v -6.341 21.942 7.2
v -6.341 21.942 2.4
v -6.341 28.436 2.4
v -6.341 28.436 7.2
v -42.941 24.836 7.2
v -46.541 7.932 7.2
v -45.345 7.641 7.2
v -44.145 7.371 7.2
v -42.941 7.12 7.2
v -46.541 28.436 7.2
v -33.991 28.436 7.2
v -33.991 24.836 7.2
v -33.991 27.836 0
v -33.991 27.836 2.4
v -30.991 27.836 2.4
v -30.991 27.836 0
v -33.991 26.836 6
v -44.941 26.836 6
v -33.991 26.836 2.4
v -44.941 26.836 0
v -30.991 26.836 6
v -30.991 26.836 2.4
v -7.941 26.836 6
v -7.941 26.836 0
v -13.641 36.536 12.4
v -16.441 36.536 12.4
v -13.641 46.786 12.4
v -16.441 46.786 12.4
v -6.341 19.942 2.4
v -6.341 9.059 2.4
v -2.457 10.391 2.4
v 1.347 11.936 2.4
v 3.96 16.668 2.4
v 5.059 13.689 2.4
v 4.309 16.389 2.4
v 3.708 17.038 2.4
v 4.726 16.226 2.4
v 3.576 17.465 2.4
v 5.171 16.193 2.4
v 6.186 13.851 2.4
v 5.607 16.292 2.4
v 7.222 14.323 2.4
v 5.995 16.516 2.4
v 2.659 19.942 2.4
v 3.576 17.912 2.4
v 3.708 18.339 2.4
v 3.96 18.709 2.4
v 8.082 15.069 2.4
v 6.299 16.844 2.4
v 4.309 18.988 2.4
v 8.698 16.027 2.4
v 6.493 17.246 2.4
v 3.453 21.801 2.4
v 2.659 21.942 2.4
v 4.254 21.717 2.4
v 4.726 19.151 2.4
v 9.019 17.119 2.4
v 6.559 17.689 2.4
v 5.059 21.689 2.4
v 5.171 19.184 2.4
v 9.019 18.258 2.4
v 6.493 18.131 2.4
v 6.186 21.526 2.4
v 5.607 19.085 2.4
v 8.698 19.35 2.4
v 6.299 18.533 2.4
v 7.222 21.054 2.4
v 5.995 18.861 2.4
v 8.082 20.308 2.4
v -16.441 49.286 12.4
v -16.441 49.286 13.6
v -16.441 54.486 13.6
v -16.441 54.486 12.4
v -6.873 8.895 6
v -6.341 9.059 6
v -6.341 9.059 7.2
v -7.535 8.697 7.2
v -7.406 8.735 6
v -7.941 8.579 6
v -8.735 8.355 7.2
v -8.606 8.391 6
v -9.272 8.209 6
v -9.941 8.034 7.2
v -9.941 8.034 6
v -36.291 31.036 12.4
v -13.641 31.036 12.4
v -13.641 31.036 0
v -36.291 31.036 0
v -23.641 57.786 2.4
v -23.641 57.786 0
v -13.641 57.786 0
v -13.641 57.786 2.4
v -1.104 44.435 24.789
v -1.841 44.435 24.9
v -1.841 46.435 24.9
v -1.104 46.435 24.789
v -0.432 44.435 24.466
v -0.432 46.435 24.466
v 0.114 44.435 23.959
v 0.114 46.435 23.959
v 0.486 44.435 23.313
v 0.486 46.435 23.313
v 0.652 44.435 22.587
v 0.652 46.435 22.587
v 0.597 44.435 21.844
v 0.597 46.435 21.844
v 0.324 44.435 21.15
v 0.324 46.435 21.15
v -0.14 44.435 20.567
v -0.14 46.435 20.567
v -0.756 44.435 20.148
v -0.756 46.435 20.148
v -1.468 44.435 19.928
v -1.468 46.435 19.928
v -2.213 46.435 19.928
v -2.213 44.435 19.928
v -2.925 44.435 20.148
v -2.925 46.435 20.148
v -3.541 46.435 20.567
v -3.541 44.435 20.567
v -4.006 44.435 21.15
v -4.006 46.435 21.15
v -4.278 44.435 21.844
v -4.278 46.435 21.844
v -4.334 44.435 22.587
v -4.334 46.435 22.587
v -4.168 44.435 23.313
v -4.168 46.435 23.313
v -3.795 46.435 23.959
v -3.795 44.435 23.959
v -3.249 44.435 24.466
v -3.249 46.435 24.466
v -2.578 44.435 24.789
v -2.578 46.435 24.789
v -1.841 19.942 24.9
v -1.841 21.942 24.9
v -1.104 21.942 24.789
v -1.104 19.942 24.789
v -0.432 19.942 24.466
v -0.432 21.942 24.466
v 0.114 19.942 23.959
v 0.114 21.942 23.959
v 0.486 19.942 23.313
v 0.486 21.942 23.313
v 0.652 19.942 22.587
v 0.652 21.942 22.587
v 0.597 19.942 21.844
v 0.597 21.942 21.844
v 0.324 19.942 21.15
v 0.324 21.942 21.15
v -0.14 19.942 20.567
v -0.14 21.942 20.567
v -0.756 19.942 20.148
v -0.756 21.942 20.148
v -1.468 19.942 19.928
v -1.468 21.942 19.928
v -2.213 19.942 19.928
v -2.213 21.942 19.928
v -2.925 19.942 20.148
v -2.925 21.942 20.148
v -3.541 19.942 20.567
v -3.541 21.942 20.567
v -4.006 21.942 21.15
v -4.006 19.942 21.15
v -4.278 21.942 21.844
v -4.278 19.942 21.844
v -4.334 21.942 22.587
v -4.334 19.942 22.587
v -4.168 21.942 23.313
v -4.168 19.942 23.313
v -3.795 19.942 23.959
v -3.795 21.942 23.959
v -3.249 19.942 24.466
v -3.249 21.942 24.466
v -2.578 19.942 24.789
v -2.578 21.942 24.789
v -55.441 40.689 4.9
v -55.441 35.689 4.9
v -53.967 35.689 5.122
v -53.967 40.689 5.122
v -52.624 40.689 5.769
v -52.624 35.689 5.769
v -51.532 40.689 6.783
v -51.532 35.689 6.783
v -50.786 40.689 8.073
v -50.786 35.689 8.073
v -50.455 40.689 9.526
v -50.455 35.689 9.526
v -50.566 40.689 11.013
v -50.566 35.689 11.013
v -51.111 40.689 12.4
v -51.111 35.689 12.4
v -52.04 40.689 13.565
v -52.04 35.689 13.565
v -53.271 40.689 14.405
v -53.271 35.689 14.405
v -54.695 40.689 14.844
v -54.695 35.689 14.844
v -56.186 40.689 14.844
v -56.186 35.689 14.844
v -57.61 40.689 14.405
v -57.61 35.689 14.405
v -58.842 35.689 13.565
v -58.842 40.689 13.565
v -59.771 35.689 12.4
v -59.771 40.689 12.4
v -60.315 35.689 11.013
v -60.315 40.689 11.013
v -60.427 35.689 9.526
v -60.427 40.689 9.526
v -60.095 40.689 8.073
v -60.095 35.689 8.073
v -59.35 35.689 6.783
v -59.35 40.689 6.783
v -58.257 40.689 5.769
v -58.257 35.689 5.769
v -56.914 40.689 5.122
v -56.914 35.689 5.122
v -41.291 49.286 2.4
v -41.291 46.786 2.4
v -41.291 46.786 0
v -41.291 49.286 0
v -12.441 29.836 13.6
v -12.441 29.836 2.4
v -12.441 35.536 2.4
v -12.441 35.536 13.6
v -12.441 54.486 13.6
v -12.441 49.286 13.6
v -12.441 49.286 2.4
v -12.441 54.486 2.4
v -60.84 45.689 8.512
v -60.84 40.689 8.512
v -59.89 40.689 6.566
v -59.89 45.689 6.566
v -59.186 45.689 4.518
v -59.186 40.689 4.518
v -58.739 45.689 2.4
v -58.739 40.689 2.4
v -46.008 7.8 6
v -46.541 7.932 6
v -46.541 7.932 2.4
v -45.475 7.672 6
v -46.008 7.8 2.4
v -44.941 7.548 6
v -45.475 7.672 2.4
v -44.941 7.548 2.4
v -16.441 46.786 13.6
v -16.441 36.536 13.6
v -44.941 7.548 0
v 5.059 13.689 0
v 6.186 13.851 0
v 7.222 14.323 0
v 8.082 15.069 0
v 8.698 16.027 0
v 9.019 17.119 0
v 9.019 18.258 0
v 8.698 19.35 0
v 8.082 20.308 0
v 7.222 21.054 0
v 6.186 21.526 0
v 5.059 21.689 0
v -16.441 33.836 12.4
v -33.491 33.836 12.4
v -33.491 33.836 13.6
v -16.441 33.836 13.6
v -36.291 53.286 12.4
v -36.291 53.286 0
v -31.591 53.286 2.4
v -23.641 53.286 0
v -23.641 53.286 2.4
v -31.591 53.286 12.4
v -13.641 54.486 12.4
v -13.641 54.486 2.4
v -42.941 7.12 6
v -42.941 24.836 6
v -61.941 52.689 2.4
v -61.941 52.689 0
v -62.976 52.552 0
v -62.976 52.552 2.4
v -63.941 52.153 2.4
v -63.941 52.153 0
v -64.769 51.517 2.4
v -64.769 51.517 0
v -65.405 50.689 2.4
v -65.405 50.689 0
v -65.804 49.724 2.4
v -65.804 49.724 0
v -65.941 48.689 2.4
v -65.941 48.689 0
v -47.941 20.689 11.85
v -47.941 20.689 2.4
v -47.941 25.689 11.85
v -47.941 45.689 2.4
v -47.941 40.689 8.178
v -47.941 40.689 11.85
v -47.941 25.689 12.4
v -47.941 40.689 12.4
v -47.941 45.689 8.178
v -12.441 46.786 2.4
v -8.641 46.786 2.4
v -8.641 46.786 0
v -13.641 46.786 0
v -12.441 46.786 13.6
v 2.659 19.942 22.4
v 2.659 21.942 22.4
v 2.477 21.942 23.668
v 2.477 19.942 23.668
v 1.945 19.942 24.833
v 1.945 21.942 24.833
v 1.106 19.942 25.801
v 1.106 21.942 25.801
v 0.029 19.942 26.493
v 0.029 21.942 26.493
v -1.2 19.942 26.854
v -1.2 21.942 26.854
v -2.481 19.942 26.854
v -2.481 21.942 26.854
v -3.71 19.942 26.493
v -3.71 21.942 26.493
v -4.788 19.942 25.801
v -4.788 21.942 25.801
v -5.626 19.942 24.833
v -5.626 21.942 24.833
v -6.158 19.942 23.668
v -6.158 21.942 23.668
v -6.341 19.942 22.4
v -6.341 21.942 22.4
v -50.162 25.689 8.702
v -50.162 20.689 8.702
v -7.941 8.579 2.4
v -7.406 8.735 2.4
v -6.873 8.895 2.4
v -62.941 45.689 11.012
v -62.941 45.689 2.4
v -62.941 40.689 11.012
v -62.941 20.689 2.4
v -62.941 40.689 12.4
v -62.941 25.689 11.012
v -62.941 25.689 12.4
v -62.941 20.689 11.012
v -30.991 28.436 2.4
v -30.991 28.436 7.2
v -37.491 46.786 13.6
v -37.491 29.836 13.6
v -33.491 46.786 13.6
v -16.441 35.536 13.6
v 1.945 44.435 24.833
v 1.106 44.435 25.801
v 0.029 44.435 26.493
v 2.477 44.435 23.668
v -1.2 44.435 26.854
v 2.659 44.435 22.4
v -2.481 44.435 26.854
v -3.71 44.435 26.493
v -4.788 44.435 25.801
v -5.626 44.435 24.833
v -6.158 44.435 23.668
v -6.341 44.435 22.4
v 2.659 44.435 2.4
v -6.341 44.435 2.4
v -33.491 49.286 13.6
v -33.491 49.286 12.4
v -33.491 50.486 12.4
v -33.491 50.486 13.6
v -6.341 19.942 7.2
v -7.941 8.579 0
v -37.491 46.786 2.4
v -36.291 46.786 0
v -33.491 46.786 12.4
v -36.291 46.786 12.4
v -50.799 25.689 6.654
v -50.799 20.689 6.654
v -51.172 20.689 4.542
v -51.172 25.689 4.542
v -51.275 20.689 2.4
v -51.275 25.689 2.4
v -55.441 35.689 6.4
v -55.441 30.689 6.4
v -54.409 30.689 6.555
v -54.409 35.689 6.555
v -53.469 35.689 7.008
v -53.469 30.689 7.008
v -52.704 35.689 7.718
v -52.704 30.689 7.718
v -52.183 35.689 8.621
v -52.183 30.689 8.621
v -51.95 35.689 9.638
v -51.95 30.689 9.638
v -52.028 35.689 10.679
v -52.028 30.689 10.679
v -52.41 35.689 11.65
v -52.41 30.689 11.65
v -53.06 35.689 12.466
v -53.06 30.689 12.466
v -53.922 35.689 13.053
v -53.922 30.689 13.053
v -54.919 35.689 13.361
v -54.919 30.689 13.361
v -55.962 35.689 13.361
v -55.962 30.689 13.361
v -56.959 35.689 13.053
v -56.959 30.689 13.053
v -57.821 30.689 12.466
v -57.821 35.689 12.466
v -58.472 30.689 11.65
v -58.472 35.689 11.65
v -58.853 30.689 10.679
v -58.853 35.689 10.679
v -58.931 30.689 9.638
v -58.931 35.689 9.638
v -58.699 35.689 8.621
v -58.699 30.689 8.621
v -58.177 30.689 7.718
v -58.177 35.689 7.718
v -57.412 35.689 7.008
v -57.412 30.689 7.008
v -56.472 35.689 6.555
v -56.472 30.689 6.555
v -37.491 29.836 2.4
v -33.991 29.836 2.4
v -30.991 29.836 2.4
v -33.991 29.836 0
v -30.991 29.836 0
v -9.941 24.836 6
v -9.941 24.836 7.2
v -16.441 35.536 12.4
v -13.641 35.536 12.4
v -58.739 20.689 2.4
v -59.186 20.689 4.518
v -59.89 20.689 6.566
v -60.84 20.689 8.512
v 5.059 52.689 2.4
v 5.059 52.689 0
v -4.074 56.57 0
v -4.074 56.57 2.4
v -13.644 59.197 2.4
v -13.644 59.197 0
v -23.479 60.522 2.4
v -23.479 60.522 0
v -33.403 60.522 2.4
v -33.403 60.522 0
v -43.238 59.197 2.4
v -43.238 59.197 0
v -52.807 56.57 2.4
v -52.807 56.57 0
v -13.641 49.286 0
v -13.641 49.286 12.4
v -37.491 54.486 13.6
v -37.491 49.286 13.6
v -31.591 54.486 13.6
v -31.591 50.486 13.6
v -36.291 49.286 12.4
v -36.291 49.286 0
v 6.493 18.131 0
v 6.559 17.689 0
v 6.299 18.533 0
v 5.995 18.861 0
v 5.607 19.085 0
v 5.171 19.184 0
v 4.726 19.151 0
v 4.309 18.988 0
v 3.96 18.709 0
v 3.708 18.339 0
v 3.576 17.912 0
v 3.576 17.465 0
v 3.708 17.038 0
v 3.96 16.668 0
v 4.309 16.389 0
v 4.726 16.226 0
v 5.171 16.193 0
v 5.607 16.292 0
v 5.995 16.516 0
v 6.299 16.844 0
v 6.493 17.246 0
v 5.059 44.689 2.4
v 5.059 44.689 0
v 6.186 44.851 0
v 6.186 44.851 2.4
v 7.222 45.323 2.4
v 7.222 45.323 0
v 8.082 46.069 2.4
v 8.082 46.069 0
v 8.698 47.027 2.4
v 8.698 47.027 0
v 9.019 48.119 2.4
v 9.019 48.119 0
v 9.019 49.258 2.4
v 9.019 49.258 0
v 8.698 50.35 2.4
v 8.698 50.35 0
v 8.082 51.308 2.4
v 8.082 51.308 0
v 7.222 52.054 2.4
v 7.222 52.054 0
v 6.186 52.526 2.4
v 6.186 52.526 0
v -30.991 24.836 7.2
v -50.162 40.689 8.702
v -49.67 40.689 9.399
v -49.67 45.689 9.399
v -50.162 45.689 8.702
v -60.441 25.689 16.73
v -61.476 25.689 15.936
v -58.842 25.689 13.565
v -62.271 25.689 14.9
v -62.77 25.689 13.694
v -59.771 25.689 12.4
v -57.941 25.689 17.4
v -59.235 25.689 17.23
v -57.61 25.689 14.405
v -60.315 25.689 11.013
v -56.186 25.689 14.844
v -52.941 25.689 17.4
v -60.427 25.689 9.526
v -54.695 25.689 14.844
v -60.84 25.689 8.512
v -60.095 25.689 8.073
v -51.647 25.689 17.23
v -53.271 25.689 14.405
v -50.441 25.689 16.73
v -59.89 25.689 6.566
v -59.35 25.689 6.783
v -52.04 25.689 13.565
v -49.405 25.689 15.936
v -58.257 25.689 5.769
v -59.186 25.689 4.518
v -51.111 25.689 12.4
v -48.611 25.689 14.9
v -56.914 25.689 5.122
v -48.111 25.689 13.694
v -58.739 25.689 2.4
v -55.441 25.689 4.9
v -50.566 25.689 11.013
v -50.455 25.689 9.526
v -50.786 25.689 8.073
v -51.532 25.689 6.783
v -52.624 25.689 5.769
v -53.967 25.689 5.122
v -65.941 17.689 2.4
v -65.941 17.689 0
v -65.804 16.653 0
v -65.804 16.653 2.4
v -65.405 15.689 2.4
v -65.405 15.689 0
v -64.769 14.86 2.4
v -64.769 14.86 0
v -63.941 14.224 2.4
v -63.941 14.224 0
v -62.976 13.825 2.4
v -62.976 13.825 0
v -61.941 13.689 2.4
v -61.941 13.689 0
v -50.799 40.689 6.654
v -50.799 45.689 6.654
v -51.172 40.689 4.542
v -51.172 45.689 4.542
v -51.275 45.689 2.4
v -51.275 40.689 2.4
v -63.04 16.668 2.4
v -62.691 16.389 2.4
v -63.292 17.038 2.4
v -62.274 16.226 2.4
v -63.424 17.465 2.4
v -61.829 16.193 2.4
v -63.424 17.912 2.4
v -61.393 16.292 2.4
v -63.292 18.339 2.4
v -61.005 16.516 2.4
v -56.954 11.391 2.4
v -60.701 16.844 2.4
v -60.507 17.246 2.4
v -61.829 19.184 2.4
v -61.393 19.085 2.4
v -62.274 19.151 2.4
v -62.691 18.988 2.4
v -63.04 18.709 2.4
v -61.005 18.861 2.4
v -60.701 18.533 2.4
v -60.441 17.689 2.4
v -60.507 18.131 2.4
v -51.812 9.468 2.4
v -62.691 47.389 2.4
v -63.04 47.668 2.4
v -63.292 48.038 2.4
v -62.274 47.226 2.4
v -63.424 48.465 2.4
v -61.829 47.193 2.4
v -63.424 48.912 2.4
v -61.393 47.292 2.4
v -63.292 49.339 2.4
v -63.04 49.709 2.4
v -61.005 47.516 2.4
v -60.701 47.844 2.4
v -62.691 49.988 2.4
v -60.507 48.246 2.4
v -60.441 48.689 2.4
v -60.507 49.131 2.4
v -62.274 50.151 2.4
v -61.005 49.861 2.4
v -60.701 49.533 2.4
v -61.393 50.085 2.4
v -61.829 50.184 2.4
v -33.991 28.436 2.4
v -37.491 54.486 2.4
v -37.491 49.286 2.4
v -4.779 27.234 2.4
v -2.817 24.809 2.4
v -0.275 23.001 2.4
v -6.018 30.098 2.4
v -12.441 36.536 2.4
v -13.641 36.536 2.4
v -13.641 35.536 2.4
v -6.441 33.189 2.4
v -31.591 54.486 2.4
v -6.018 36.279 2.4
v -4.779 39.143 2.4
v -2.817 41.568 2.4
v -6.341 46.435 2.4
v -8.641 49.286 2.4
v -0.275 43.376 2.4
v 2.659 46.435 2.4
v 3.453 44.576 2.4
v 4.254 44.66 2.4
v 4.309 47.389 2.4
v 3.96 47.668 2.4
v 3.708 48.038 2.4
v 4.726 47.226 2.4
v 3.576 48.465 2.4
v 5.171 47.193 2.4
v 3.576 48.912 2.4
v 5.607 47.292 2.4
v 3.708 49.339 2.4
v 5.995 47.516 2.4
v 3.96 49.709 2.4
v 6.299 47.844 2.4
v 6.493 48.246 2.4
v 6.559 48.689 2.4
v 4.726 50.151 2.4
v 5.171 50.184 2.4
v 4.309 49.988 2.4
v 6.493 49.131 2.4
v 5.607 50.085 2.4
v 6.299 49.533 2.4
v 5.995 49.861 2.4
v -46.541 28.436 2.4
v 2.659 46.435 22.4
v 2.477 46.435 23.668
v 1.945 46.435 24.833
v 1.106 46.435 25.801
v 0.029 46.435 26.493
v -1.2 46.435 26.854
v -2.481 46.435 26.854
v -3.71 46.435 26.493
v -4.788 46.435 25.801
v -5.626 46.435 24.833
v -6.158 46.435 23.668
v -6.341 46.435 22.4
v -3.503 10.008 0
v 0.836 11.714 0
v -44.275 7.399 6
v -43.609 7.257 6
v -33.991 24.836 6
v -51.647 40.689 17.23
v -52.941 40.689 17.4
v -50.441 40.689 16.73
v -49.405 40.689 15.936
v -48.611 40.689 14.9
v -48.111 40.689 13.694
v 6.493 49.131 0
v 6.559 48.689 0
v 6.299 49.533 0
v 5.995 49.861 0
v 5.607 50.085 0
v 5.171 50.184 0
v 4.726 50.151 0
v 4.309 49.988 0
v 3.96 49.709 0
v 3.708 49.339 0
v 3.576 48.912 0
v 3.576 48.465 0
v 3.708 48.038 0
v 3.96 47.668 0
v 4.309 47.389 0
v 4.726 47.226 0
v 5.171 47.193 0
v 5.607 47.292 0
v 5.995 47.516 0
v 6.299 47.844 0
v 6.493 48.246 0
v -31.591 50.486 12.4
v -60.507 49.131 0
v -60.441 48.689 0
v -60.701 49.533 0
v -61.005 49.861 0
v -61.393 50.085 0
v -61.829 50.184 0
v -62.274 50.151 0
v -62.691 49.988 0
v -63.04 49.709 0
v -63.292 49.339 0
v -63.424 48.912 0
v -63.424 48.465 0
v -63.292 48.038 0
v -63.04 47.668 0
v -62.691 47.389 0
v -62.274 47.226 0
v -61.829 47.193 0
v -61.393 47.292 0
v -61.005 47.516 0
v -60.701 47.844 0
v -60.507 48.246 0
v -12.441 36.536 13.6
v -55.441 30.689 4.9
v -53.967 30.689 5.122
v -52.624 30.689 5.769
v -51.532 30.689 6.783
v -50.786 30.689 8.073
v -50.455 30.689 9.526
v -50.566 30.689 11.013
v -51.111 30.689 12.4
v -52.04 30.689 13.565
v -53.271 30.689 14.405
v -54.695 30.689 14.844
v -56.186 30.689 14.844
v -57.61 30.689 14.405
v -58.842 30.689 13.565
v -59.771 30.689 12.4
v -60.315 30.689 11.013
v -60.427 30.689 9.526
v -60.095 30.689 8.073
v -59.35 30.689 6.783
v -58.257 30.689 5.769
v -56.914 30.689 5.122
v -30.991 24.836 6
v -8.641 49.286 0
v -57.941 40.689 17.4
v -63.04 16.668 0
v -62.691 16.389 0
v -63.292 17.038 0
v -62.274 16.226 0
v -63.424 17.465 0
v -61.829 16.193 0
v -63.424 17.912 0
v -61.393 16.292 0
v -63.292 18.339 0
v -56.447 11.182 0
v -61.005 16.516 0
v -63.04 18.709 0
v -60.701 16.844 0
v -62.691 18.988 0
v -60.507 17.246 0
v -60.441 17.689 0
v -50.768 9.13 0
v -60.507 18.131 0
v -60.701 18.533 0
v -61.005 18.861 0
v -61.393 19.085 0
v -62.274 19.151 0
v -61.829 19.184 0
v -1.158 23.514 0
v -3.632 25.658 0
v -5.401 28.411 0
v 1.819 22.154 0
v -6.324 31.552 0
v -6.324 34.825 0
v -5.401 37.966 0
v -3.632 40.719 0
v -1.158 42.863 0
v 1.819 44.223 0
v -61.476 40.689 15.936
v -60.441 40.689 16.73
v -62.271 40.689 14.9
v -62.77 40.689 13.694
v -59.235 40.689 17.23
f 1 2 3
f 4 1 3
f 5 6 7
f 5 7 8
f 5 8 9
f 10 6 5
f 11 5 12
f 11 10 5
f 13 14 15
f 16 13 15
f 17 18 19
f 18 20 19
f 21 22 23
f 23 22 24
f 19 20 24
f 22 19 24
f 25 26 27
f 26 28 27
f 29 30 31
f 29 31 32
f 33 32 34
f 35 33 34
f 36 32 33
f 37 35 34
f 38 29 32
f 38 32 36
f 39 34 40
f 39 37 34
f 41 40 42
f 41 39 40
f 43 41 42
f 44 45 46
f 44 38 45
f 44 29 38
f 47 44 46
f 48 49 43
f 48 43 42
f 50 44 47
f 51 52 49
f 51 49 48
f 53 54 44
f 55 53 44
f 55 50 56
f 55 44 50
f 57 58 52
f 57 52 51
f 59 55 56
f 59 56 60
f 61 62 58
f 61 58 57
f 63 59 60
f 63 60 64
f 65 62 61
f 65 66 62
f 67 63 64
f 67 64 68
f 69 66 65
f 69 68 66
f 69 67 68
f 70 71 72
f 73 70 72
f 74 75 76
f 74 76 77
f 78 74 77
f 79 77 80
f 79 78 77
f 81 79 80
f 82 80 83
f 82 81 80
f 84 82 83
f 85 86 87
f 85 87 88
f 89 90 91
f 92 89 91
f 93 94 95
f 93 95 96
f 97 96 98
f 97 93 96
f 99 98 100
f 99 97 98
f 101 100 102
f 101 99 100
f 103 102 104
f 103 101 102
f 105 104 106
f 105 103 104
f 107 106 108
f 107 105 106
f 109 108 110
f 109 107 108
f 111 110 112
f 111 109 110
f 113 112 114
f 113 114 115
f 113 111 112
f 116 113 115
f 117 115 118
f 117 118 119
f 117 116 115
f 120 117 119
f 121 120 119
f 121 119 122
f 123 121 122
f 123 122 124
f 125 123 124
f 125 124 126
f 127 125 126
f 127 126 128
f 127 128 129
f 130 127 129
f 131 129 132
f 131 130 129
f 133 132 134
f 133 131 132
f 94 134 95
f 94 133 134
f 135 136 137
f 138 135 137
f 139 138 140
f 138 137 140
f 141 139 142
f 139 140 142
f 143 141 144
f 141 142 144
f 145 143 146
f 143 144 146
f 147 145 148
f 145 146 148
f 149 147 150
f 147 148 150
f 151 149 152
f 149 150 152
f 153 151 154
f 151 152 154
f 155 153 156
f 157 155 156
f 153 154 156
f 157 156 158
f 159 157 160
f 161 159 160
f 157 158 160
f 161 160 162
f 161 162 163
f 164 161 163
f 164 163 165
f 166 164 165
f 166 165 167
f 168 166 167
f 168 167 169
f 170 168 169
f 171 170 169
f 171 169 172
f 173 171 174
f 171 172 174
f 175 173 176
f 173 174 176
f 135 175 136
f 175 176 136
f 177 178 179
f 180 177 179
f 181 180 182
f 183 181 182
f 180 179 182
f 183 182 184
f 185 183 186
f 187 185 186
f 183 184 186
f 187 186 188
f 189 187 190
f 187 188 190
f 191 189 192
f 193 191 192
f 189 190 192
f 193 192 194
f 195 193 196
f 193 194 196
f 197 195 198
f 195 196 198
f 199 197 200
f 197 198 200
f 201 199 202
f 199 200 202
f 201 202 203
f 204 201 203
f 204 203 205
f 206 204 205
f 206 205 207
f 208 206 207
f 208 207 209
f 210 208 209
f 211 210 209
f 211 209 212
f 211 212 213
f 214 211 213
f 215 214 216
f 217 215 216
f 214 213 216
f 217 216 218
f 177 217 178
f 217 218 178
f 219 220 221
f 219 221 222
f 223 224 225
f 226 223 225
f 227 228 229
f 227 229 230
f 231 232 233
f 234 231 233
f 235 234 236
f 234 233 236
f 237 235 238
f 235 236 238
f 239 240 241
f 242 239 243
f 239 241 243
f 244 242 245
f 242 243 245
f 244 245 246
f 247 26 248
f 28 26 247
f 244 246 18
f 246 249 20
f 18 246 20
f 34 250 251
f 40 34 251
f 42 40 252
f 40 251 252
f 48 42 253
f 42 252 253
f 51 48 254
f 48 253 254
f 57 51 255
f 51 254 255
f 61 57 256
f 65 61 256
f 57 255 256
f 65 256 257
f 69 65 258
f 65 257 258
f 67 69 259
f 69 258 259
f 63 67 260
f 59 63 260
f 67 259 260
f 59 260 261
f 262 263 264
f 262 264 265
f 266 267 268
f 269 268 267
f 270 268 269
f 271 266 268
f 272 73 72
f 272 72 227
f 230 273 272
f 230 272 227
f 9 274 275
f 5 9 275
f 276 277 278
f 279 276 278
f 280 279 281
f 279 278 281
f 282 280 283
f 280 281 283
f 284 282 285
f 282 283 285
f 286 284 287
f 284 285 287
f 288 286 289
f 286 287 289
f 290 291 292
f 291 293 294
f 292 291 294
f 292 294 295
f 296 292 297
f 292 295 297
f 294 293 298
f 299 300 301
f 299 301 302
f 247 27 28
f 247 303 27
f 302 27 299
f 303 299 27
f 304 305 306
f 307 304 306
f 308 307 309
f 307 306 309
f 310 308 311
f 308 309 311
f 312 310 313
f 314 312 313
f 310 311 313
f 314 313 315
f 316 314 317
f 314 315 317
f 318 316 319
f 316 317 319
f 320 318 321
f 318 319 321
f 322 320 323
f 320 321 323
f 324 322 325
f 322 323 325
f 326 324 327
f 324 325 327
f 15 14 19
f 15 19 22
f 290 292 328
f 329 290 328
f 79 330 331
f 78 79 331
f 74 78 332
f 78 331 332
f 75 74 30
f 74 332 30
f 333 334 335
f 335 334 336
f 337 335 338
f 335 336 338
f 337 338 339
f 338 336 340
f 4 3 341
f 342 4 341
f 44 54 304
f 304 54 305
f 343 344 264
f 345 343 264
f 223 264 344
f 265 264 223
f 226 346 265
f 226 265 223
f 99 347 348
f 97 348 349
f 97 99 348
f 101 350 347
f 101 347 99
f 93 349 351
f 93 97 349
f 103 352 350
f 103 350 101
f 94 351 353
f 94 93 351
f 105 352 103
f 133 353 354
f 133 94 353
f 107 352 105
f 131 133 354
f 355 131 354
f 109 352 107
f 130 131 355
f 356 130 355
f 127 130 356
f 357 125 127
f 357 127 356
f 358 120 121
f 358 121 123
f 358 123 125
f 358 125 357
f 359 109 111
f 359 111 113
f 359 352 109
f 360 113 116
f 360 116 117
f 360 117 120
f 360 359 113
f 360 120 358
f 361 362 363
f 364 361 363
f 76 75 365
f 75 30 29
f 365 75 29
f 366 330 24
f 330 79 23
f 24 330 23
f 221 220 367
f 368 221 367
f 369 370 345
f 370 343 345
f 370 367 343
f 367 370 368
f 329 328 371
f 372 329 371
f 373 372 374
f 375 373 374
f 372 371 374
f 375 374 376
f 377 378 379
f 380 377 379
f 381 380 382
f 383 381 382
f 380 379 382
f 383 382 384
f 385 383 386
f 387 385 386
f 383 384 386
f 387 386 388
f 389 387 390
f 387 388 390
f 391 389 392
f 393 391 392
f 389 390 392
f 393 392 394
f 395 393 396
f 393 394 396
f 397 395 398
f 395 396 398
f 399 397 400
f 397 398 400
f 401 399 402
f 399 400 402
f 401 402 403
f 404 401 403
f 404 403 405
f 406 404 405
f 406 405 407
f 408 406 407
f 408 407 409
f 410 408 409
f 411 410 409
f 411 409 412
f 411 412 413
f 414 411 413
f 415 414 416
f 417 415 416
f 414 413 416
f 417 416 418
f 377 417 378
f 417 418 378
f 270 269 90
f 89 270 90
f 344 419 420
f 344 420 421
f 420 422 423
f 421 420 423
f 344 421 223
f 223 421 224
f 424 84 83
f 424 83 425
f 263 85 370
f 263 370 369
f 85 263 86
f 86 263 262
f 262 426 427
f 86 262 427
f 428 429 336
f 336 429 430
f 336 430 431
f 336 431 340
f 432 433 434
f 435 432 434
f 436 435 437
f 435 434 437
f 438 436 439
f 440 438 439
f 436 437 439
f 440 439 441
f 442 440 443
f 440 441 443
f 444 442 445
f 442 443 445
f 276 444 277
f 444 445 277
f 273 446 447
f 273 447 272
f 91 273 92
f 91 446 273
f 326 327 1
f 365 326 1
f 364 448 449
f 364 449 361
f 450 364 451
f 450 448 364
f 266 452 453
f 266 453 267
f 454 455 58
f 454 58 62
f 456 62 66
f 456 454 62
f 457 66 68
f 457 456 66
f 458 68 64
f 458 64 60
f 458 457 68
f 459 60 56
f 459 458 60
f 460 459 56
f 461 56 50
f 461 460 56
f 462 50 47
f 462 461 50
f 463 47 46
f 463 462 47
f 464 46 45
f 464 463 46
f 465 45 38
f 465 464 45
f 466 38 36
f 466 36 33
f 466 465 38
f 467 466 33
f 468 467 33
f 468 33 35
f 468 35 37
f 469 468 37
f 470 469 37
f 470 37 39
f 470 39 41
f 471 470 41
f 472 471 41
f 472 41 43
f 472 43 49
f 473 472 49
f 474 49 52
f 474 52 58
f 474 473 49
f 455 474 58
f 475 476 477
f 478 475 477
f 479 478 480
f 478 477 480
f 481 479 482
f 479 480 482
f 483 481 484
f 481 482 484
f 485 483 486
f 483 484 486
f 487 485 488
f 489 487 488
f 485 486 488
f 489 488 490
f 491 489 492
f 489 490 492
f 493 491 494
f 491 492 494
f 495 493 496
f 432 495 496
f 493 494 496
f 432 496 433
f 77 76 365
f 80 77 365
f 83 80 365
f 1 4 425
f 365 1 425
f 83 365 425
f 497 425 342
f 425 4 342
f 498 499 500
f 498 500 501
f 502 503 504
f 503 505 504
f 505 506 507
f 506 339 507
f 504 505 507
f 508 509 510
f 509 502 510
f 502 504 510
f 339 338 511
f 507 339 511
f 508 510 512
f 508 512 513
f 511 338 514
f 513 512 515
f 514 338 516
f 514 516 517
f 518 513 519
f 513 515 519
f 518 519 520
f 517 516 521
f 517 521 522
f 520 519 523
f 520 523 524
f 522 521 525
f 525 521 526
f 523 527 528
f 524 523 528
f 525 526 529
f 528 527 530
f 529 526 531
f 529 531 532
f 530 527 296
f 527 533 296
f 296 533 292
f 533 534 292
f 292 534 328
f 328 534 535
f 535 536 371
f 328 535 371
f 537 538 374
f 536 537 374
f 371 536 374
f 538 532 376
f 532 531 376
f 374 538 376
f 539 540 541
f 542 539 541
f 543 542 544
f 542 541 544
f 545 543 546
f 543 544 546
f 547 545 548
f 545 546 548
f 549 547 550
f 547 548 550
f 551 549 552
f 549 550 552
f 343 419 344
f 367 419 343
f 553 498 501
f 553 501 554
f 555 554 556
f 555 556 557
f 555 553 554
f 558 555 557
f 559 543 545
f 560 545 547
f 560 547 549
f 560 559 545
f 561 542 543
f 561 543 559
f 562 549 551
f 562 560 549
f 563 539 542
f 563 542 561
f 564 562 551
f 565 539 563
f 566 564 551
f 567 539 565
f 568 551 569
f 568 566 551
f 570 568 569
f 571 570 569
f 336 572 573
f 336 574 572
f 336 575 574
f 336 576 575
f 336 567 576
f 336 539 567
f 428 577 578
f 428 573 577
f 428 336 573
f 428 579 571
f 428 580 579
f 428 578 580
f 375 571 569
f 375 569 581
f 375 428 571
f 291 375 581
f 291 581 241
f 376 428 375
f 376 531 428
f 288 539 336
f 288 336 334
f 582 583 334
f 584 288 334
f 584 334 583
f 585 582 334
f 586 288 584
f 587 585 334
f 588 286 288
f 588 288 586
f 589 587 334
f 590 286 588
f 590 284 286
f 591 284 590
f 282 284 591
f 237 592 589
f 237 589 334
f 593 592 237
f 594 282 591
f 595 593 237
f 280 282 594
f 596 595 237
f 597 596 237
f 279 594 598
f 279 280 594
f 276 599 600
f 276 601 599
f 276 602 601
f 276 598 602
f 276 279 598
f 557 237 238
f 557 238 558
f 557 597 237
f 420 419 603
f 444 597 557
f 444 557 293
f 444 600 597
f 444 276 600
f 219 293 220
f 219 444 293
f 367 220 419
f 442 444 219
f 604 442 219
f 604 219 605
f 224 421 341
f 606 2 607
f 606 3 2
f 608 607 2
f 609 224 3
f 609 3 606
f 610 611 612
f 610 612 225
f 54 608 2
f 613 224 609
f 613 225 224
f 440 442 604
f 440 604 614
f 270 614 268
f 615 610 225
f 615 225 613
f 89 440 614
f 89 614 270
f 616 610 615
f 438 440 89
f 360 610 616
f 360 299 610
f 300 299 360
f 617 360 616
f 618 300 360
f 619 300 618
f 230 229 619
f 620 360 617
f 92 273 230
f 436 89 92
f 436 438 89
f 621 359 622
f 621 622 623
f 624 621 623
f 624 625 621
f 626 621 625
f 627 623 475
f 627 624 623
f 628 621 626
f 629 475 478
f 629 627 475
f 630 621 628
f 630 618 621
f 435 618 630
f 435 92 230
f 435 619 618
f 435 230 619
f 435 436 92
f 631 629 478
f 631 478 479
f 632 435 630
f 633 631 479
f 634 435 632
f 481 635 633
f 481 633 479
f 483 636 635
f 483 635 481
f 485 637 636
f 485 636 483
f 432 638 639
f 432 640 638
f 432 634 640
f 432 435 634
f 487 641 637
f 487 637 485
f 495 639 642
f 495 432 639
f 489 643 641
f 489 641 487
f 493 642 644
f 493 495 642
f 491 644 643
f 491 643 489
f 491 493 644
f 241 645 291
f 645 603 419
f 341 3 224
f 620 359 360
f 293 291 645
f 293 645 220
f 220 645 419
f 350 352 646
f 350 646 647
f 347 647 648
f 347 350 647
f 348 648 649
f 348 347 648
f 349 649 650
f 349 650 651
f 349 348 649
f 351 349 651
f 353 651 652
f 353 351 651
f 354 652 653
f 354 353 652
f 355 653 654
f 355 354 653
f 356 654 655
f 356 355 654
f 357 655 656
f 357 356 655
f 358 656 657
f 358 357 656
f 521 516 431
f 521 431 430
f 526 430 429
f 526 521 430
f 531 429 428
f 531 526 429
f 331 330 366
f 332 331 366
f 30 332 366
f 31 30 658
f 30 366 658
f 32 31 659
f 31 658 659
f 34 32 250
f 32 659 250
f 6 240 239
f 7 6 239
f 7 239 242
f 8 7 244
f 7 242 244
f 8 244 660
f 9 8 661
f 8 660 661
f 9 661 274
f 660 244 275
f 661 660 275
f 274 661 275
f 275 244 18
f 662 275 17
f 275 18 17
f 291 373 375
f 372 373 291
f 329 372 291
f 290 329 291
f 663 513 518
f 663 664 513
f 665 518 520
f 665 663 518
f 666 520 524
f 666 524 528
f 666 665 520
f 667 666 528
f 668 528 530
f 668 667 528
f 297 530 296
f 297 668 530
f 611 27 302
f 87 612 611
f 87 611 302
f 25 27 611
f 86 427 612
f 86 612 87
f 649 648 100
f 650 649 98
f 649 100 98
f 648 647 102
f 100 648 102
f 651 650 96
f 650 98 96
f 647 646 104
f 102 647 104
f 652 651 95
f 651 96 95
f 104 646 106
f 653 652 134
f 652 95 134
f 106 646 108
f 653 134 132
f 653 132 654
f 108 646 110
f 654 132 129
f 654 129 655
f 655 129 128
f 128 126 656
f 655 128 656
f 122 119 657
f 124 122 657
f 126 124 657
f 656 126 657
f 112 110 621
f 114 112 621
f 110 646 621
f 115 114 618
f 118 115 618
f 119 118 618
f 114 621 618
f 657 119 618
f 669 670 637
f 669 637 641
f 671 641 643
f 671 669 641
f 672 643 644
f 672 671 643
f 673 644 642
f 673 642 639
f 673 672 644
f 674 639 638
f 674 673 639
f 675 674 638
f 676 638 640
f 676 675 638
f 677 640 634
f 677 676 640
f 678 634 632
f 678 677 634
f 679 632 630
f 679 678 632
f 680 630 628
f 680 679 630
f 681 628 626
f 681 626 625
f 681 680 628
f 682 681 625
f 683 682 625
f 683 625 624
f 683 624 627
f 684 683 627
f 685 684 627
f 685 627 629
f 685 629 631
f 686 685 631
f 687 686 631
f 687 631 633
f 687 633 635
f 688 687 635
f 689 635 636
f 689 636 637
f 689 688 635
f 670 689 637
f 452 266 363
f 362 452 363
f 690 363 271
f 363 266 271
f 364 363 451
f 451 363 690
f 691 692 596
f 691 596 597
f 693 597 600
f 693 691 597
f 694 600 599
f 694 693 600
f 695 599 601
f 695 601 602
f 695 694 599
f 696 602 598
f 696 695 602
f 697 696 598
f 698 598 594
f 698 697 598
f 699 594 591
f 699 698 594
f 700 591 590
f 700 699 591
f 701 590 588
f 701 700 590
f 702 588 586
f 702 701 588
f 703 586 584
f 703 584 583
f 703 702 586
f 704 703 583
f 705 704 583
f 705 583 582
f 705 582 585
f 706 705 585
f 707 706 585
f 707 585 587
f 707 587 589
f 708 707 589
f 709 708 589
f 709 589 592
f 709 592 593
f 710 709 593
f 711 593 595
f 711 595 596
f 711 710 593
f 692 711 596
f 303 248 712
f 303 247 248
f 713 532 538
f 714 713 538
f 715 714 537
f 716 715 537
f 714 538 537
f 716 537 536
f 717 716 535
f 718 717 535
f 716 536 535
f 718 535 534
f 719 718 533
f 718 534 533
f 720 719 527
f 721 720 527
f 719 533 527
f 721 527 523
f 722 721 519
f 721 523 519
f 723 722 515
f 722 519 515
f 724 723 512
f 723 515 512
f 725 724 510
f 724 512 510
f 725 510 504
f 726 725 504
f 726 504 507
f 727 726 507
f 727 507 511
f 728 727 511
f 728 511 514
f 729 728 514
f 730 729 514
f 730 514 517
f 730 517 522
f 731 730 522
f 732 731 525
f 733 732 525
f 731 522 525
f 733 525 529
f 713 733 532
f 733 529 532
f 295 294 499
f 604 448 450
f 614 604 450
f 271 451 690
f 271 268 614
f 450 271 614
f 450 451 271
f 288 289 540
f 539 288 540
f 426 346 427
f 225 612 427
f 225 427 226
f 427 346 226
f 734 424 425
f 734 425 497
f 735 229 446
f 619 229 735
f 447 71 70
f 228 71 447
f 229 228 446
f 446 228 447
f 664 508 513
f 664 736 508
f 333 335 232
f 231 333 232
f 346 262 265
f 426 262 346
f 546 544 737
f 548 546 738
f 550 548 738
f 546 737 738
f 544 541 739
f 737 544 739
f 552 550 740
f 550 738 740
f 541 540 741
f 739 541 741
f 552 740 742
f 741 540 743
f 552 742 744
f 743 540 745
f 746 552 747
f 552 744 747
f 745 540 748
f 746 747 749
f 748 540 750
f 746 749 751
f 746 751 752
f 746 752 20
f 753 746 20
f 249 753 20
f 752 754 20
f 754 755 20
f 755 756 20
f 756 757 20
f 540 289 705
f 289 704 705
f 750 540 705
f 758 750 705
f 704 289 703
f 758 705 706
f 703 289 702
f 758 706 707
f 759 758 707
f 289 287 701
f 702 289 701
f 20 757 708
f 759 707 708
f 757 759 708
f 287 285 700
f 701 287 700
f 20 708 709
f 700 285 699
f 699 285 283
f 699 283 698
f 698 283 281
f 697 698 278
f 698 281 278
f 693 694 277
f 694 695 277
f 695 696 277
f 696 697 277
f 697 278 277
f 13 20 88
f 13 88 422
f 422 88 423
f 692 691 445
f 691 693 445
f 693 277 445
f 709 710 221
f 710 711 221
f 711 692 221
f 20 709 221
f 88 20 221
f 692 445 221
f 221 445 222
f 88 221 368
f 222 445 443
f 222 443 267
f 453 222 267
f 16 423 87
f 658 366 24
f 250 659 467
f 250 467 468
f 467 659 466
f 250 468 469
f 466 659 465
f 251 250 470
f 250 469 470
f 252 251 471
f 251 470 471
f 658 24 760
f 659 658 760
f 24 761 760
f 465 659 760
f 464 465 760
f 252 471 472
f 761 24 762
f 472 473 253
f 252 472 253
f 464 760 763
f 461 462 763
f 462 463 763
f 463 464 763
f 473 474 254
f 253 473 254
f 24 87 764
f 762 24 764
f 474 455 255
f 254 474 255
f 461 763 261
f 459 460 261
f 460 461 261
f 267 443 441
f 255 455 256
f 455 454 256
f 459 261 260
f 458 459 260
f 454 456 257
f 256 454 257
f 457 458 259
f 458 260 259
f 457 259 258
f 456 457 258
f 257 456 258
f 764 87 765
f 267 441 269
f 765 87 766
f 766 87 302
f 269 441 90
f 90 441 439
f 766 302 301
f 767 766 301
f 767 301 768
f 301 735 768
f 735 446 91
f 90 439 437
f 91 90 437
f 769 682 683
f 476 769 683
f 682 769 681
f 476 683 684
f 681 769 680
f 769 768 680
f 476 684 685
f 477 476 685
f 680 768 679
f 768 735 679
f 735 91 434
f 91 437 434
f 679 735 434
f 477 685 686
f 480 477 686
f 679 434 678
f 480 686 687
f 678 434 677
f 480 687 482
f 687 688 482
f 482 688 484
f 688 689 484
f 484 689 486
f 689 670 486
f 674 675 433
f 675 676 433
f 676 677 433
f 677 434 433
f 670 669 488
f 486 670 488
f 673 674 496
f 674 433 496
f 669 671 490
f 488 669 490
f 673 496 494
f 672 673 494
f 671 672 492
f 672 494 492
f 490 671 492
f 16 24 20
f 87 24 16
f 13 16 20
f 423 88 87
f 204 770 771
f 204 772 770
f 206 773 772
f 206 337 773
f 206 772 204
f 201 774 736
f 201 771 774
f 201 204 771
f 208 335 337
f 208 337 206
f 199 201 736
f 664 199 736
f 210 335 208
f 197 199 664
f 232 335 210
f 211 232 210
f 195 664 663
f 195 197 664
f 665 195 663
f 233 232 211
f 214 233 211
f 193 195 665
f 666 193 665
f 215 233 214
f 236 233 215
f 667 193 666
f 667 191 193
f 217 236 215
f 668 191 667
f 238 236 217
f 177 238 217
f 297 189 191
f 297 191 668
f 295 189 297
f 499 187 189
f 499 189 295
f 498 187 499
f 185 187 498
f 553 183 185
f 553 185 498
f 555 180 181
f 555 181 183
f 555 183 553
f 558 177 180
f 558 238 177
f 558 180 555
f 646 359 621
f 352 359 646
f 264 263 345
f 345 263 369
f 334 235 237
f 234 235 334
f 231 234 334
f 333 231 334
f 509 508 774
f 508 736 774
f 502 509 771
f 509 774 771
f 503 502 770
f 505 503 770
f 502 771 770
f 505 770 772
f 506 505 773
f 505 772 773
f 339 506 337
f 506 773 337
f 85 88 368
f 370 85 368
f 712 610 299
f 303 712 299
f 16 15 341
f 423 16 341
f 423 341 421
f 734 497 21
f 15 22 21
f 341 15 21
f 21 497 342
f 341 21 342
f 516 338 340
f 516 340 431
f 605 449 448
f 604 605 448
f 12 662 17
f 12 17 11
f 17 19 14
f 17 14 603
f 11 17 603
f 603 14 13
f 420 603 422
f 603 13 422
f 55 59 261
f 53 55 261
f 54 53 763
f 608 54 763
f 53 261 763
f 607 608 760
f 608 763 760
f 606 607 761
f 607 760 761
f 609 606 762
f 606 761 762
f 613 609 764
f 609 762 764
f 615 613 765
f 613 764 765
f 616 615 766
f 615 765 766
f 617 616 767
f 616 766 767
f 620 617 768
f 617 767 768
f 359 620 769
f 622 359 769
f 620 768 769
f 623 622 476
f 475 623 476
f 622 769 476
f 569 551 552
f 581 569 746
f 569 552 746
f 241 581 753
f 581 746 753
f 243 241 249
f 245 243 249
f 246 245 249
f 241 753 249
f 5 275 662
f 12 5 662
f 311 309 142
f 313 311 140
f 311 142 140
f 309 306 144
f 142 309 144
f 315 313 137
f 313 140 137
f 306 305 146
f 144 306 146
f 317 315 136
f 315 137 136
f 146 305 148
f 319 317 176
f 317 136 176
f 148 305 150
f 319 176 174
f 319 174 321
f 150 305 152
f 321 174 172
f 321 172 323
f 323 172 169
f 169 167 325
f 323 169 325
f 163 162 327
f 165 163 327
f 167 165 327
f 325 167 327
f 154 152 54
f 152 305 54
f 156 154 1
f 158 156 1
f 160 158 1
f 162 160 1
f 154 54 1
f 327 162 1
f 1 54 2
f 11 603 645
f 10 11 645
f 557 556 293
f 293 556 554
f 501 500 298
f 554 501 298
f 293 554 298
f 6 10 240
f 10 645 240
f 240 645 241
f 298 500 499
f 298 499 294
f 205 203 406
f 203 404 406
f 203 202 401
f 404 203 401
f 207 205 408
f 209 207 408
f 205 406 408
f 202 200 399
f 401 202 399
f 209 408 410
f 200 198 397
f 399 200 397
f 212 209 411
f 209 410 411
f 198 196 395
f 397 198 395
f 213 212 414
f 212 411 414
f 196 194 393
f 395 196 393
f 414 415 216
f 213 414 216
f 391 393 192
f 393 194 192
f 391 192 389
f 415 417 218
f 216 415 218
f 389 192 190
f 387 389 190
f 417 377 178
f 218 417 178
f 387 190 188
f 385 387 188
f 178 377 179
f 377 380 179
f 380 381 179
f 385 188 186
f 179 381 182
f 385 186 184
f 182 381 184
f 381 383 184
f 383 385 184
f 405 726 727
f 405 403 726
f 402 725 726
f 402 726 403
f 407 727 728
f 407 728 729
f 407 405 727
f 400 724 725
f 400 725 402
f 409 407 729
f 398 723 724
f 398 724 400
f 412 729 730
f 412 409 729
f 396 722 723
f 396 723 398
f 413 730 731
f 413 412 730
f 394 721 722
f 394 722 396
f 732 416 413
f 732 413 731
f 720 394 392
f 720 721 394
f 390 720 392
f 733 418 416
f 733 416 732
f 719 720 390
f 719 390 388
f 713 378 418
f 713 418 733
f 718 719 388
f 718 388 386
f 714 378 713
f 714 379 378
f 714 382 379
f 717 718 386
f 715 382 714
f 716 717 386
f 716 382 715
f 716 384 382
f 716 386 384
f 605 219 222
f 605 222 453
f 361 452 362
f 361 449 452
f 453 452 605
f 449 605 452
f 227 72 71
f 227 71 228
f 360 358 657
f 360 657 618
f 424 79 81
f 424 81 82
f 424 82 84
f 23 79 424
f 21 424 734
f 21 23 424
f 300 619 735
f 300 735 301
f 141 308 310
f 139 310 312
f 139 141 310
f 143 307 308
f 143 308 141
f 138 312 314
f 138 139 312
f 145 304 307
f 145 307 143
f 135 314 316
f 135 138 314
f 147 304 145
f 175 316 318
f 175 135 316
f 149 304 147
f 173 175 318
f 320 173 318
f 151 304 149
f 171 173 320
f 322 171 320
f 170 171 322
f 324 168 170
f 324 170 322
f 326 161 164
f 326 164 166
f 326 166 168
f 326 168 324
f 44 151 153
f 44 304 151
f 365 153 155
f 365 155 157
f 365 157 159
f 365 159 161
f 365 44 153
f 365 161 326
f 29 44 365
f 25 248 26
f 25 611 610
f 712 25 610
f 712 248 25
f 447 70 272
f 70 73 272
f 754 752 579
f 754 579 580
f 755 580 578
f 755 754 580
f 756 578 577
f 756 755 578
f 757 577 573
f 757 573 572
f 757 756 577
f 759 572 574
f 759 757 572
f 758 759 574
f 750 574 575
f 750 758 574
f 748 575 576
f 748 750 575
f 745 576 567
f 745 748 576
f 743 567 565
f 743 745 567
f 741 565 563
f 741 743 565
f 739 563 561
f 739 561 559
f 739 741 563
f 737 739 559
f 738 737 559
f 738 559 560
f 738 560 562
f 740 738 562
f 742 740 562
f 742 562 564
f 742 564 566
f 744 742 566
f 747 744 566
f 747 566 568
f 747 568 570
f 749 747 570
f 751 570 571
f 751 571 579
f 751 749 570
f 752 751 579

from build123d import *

# Parameters (mm, degrees)
CROQUIS1_R                 = 1.5
SALIENTE_EXTRUIR1_DEPTH    = 2.4
CROQUIS3_W                 = 25.05
CROQUIS3_H                 = 24.65
CROQUIS3_W_2               = 22.65
CROQUIS3_H_2               = 22.25
SALIENTE_EXTRUIR2_DEPTH    = 10
CROQUIS4_W                 = 25.05
CROQUIS4_H                 = 24.65
CROQUIS4_W_2               = 17.05
CROQUIS4_H_2               = 16.65
SALIENTE_EXTRUIR3_DEPTH    = 1.2
CROQUIS5_W                 = 4
CROQUIS5_H                 = 2.5
CROQUIS5_W_2               = 15.15
CROQUIS5_H_2               = 4
CROQUIS5_H_3               = 1
CORTAR_EXTRUIR1_DEPTH      = 11.2
CROQUIS8_W                 = 15
CROQUIS8_H                 = 15
SALIENTE_EXTRUIR5_DEPTH    = 15
CROQUIS10_R                = 5
CORTAR_EXTRUIR2_DEPTH      = 5
CORTAR_EXTRUIR3_START      = -10
CROQUIS10_2_R              = 5
CORTAR_EXTRUIR3_DEPTH      = 5
CROQUIS11_R                = 3.5
CORTAR_EXTRUIR4_DEPTH      = 5
CORTAR_EXTRUIR5_DEPTH      = 2.4
CORTAR_EXTRUIR6_DEPTH      = 10
CORTAR_EXTRUIR6_DEPTH_BACK = 2.4
CROQUIS13_W                = 10
CROQUIS13_H                = 4.5
REDONDEO1_R                = 5
CORTAR_EXTRUIR7_REACH      = 92.864
CROQUIS14_W                = 37
CROQUIS14_H                = 25
CROQUIS14_W_2              = 3
CROQUIS14_H_2              = 2
SALIENTE_EXTRUIR6_DEPTH    = 3.6
SALIENTE_EXTRUIR7_DEPTH    = 1.2
SALIENTE_EXTRUIR8_DEPTH    = 5
CORTAR_EXTRUIR8_DEPTH      = 5.000001
CROQUIS25_R                = 2.5
SALIENTE_EXTRUIR9_DEPTH    = 2


with BuildPart() as part:
    # Croquis1 → Saliente-Extruir1 (new body)
    with BuildSketch(Plane.XY):
        with BuildLine():
            Line((-65.940699516, 48.688511327), (-65.940699516, 17.688511327))
            ThreePointArc((-65.940699516, 17.688511327), (-64.76912664, 14.860084202), (-61.940699516, 13.688511327))
            ThreePointArc((-61.940699516, 13.688511327), (-28.440699516, 5.688511327), (5.059300484, 13.688511327))
            ThreePointArc((5.059300484, 13.688511327), (9.059300484, 17.688511327), (5.059300484, 21.688511327))
            ThreePointArc((5.059300484, 21.688511327), (-6.440699516, 33.188511327), (5.059300484, 44.688511327))
            ThreePointArc((5.059300484, 44.688511327), (9.059300484, 48.688511327), (5.059300484, 52.688511327))
            ThreePointArc((5.059300484, 52.688511327), (-28.440699516, 60.688511327), (-61.940699516, 52.688511327))
            ThreePointArc((-61.940699516, 52.688511327), (-64.76912664, 51.516938452), (-65.940699516, 48.688511327))
        make_face()
        with Locations((-61.940699516, 48.688511327)):
            Circle(CROQUIS1_R, mode=Mode.SUBTRACT)
        with Locations((5.059300484, 48.688511327)):
            Circle(CROQUIS1_R, mode=Mode.SUBTRACT)
        with Locations((5.059300484, 17.688511327)):
            Circle(CROQUIS1_R, mode=Mode.SUBTRACT)
        with Locations((-61.940699516, 17.688511327)):
            Circle(CROQUIS1_R, mode=Mode.SUBTRACT)
    extrude(amount=SALIENTE_EXTRUIR1_DEPTH)

    # Croquis3 → Saliente-Extruir2 (add)
    with BuildSketch(Plane.XY.offset(2.4)):
        with Locations((-24.965699516, 42.160543548)):
            Rectangle(CROQUIS3_W, CROQUIS3_H)
        with Locations((-24.965699516, 42.160543548)):
            Rectangle(CROQUIS3_W_2, CROQUIS3_H_2, mode=Mode.SUBTRACT)
    extrude(amount=SALIENTE_EXTRUIR2_DEPTH)

    # Croquis4 → Saliente-Extruir3 (add)
    with BuildSketch(Plane.XY.offset(12.4)):
        with Locations((-24.965699516, 42.160543548)):
            Rectangle(CROQUIS4_W, CROQUIS4_H)
        with Locations((-24.965699516, 42.160543548)):
            Rectangle(CROQUIS4_W_2, CROQUIS4_H_2, mode=Mode.SUBTRACT)
    extrude(amount=SALIENTE_EXTRUIR3_DEPTH)

    # Croquis5 → Cortar-Extruir1 (cut)
    with BuildSketch(Plane.XY.offset(13.6)):
        with Locations((-35.490699516, 48.035543548)):
            Rectangle(CROQUIS5_W, CROQUIS5_H)
        with Locations((-24.015699516, 52.485543548)):
            Rectangle(CROQUIS5_W_2, CROQUIS5_H_2)
        with Locations((-14.440699516, 36.035543548)):
            Rectangle(CROQUIS5_W, CROQUIS5_H_3)
        with Locations((-14.440699516, 48.035543548)):
            Rectangle(CROQUIS5_W, CROQUIS5_H)
    extrude(amount=-CORTAR_EXTRUIR1_DEPTH, mode=Mode.SUBTRACT)

    # Croquis8 → Saliente-Extruir5 (add)
    with BuildSketch(Plane.XY.offset(2.4)):
        with Locations((-55.440699516, 33.188511327)):
            Rectangle(CROQUIS8_W, CROQUIS8_H)
    extrude(amount=SALIENTE_EXTRUIR5_DEPTH)

    # Croquis10 → Cortar-Extruir2 (cut)
    with BuildSketch(Plane.XZ.offset(-25.688511327)):
        with Locations(Location((-55.440699516, 9.9, 0), (0, 0, 270))):
            Circle(CROQUIS10_R)
    extrude(amount=-CORTAR_EXTRUIR2_DEPTH, mode=Mode.SUBTRACT)

    # Croquis10<2> → Cortar-Extruir3 (cut)
    with BuildSketch(Plane.XZ.offset(-25.688511327).offset(CORTAR_EXTRUIR3_START)):
        with Locations(Location((-55.440699516, 9.9, 0), (0, 0, 270))):
            Circle(CROQUIS10_2_R)
    extrude(amount=-CORTAR_EXTRUIR3_DEPTH, mode=Mode.SUBTRACT)

    # Croquis11 → Cortar-Extruir4 (cut)
    with BuildSketch(Plane.XZ.offset(-30.688511327)):
        with Locations(Location((-55.440699516, 9.9, 0), (0, 0, 270))):
            Circle(CROQUIS11_R)
    extrude(amount=-CORTAR_EXTRUIR4_DEPTH, mode=Mode.SUBTRACT)

    # Croquis12 → Cortar-Extruir5 (cut)
    with BuildSketch(Plane.XY.offset(2.4)):
        Polygon((-36.290699516, 53.285543548), (-13.640699516, 53.285543548), (-13.640699516, 49.285543548), (-8.640699516, 49.285543548), (-8.640699516, 46.785543548), (-13.640699516, 46.785543548), (-13.640699516, 31.035543548), (-36.290699516, 31.035543548), (-36.290699516, 46.785543548), (-41.290699516, 46.785543548), (-41.290699516, 49.285543548), (-36.290699516, 49.285543548), align=None)
    extrude(amount=-CORTAR_EXTRUIR5_DEPTH, mode=Mode.SUBTRACT)

    # Croquis13 → Cortar-Extruir6 (cut, two sides: drawn at the far end of the back side and taken through both)
    with BuildSketch(Plane.XY.offset(2.4).offset(-CORTAR_EXTRUIR6_DEPTH_BACK)):
        with Locations((-18.640699516, 55.535543548)):
            Rectangle(CROQUIS13_W, CROQUIS13_H)
    extrude(amount=CORTAR_EXTRUIR6_DEPTH + CORTAR_EXTRUIR6_DEPTH_BACK, mode=Mode.SUBTRACT)

    # Redondeo1
    redondeo1_edges = [part.edges().sort_by_distance(p)[0] for p in [
        (-62.940699516, 33.188511327, 17.4),
        (-47.940699516, 33.188511327, 17.4),
    ]]
    fillet(redondeo1_edges, radius=REDONDEO1_R)

    # Croquis14 → Cortar-Extruir7 (cut, up to next)
    with BuildSketch(Plane.XY.offset(2.4), mode=Mode.PRIVATE) as cortar_extruir7_sk1:
        with Locations((-26.440699516, 14.335543548)):
            Rectangle(CROQUIS14_W, CROQUIS14_H)
    cortar_extruir7_tool1 = extrude(cortar_extruir7_sk1.sketch, amount=-CORTAR_EXTRUIR7_REACH, mode=Mode.PRIVATE) & part.part
    # Croquis14 → Cortar-Extruir7 (cut, up to next)
    with BuildSketch(Plane.XY.offset(2.4), mode=Mode.PRIVATE) as cortar_extruir7_sk2:
        with Locations((-32.490699516, 28.835543548)):
            Rectangle(CROQUIS14_W_2, CROQUIS14_H_2)
    cortar_extruir7_tool2 = extrude(cortar_extruir7_sk2.sketch, amount=-CORTAR_EXTRUIR7_REACH, mode=Mode.PRIVATE) & part.part
    add(cortar_extruir7_tool1.solids().sort_by_distance((-26.4407, 14.335544, 2.4))[0], mode=Mode.SUBTRACT)
    add(cortar_extruir7_tool2.solids().sort_by_distance((-32.4907, 28.835544, 2.4))[0], mode=Mode.SUBTRACT)

    # Croquis15 → Saliente-Extruir6 (add)
    with BuildSketch(Plane.XY.offset(2.4)):
        with BuildLine():
            Line((-44.940699516, 7.547864372), (-44.940699516, 26.835543548))
            Line((-44.940699516, 26.835543548), (-33.990699516, 26.835543548))
            Line((-33.990699516, 26.835543548), (-33.990699516, 28.435543548))
            Line((-33.990699516, 28.435543548), (-46.540699516, 28.435543548))
            Line((-46.540699516, 28.435543548), (-46.540699516, 7.931832654))
            ThreePointArc((-46.540699516, 7.931832654), (-45.74176474, 7.73540971), (-44.940699516, 7.547864372))
        make_face()
        with BuildLine():
            Line((-7.940699516, 26.835543548), (-7.940699516, 8.578997552))
            ThreePointArc((-7.940699516, 8.578997552), (-7.139347833, 8.814456916), (-6.340699516, 9.058928786))
            Line((-6.340699516, 9.058928786), (-6.340699516, 28.435543548))
            Line((-6.340699516, 28.435543548), (-30.990699516, 28.435543548))
            Line((-30.990699516, 28.435543548), (-30.990699516, 26.835543548))
            Line((-30.990699516, 26.835543548), (-7.940699516, 26.835543548))
        make_face()
    extrude(amount=SALIENTE_EXTRUIR6_DEPTH)

    # Croquis16 → Saliente-Extruir7 (add)
    with BuildSketch(Plane.XY.offset(6)):
        with BuildLine():
            Line((-33.990699516, 28.435543548), (-46.540699516, 28.435543548))
            Line((-46.540699516, 28.435543548), (-46.540699516, 7.931832654))
            ThreePointArc((-46.540699516, 7.931832654), (-44.745749867, 7.50363869), (-42.940699516, 7.120249144))
            Line((-42.940699516, 7.120249144), (-42.940699516, 24.835543548))
            Line((-42.940699516, 24.835543548), (-33.990699516, 24.835543548))
            Line((-33.990699516, 24.835543548), (-33.990699516, 28.435543548))
        make_face()
        with BuildLine():
            Line((-30.990699516, 28.435543548), (-6.340699516, 28.435543548))
            Line((-6.340699516, 28.435543548), (-6.340699516, 9.058928786))
            ThreePointArc((-6.340699516, 9.058928786), (-8.134228504, 8.523600003), (-9.940699516, 8.033716728))
            Line((-9.940699516, 8.033716728), (-9.940699516, 24.835543548))
            Line((-9.940699516, 24.835543548), (-30.990699516, 24.835543548))
            Line((-30.990699516, 24.835543548), (-30.990699516, 28.435543548))
        make_face()
    extrude(amount=SALIENTE_EXTRUIR7_DEPTH)

    # Croquis20 → Saliente-Extruir8 (add)
    with BuildSketch(Plane.XZ.offset(-25.688511327)):
        with BuildLine():
            Line((-62.940699516, 2.4), (-62.940699516, 11.011952661))
            Line((-62.940699516, 11.011952661), (-60.839725603, 8.511570775))
            ThreePointArc((-60.839725603, 8.511570775), (-59.506404562, 5.553015225), (-58.73875169, 2.4))
            Line((-58.73875169, 2.4), (-62.940699516, 2.4))
        make_face()
        with BuildLine():
            Line((-47.940699516, 2.4), (-47.940699516, 11.849634175))
            Line((-47.940699516, 11.849634175), (-50.161985782, 8.702014116))
            ThreePointArc((-50.161985782, 8.702014116), (-51.018961055, 5.604072702), (-51.275019132, 2.4))
            Line((-51.275019132, 2.4), (-47.940699516, 2.4))
        make_face()
    saliente_extruir8 = extrude(amount=SALIENTE_EXTRUIR8_DEPTH)

    # Simetría1: Saliente-Extruir8 across plane
    add(saliente_extruir8.mirror(Plane(origin=(0, 33.188511327, 0), x_dir=(0, 0, 1), z_dir=(0, -1, 0))))

    # Croquis22 → Cortar-Extruir8 (cut)
    with BuildSketch(Plane(origin=(0, 45.688511327, 0), x_dir=(1, 0, 0), z_dir=(0, 1, 0))):
        Polygon((-47.940699516, -11.849634175), (-49.670456383, -9.398523981), (-47.940699516, -8.17782863), align=None)
    extrude(amount=-CORTAR_EXTRUIR8_DEPTH, mode=Mode.SUBTRACT)

    # Croquis25 → Saliente-Extruir9 (add)
    with BuildSketch(Plane(origin=(0, 21.941734011, 0), x_dir=(1, 0, 0), z_dir=(0, 1, 0))):
        with BuildLine():
            Line((-6.340699516, -22.4), (-6.340699516, -2.4))
            Line((-6.340699516, -2.4), (2.659300484, -2.4))
            Line((2.659300484, -2.4), (2.659300484, -22.4))
            ThreePointArc((2.659300484, -22.4), (-1.840699516, -26.9), (-6.340699516, -22.4))
        make_face()
        with Locations(Location((-1.840699516, -22.4, 0), (0, 0, 270))):
            Circle(CROQUIS25_R, mode=Mode.SUBTRACT)
    saliente_extruir9 = extrude(amount=-SALIENTE_EXTRUIR9_DEPTH)

    # Simetría2: Saliente-Extruir9 across plane
    add(saliente_extruir9.mirror(Plane(origin=(0, 33.188511327, 0), x_dir=(0, 0, 1), z_dir=(0, -1, 0))))


solid = part.part
